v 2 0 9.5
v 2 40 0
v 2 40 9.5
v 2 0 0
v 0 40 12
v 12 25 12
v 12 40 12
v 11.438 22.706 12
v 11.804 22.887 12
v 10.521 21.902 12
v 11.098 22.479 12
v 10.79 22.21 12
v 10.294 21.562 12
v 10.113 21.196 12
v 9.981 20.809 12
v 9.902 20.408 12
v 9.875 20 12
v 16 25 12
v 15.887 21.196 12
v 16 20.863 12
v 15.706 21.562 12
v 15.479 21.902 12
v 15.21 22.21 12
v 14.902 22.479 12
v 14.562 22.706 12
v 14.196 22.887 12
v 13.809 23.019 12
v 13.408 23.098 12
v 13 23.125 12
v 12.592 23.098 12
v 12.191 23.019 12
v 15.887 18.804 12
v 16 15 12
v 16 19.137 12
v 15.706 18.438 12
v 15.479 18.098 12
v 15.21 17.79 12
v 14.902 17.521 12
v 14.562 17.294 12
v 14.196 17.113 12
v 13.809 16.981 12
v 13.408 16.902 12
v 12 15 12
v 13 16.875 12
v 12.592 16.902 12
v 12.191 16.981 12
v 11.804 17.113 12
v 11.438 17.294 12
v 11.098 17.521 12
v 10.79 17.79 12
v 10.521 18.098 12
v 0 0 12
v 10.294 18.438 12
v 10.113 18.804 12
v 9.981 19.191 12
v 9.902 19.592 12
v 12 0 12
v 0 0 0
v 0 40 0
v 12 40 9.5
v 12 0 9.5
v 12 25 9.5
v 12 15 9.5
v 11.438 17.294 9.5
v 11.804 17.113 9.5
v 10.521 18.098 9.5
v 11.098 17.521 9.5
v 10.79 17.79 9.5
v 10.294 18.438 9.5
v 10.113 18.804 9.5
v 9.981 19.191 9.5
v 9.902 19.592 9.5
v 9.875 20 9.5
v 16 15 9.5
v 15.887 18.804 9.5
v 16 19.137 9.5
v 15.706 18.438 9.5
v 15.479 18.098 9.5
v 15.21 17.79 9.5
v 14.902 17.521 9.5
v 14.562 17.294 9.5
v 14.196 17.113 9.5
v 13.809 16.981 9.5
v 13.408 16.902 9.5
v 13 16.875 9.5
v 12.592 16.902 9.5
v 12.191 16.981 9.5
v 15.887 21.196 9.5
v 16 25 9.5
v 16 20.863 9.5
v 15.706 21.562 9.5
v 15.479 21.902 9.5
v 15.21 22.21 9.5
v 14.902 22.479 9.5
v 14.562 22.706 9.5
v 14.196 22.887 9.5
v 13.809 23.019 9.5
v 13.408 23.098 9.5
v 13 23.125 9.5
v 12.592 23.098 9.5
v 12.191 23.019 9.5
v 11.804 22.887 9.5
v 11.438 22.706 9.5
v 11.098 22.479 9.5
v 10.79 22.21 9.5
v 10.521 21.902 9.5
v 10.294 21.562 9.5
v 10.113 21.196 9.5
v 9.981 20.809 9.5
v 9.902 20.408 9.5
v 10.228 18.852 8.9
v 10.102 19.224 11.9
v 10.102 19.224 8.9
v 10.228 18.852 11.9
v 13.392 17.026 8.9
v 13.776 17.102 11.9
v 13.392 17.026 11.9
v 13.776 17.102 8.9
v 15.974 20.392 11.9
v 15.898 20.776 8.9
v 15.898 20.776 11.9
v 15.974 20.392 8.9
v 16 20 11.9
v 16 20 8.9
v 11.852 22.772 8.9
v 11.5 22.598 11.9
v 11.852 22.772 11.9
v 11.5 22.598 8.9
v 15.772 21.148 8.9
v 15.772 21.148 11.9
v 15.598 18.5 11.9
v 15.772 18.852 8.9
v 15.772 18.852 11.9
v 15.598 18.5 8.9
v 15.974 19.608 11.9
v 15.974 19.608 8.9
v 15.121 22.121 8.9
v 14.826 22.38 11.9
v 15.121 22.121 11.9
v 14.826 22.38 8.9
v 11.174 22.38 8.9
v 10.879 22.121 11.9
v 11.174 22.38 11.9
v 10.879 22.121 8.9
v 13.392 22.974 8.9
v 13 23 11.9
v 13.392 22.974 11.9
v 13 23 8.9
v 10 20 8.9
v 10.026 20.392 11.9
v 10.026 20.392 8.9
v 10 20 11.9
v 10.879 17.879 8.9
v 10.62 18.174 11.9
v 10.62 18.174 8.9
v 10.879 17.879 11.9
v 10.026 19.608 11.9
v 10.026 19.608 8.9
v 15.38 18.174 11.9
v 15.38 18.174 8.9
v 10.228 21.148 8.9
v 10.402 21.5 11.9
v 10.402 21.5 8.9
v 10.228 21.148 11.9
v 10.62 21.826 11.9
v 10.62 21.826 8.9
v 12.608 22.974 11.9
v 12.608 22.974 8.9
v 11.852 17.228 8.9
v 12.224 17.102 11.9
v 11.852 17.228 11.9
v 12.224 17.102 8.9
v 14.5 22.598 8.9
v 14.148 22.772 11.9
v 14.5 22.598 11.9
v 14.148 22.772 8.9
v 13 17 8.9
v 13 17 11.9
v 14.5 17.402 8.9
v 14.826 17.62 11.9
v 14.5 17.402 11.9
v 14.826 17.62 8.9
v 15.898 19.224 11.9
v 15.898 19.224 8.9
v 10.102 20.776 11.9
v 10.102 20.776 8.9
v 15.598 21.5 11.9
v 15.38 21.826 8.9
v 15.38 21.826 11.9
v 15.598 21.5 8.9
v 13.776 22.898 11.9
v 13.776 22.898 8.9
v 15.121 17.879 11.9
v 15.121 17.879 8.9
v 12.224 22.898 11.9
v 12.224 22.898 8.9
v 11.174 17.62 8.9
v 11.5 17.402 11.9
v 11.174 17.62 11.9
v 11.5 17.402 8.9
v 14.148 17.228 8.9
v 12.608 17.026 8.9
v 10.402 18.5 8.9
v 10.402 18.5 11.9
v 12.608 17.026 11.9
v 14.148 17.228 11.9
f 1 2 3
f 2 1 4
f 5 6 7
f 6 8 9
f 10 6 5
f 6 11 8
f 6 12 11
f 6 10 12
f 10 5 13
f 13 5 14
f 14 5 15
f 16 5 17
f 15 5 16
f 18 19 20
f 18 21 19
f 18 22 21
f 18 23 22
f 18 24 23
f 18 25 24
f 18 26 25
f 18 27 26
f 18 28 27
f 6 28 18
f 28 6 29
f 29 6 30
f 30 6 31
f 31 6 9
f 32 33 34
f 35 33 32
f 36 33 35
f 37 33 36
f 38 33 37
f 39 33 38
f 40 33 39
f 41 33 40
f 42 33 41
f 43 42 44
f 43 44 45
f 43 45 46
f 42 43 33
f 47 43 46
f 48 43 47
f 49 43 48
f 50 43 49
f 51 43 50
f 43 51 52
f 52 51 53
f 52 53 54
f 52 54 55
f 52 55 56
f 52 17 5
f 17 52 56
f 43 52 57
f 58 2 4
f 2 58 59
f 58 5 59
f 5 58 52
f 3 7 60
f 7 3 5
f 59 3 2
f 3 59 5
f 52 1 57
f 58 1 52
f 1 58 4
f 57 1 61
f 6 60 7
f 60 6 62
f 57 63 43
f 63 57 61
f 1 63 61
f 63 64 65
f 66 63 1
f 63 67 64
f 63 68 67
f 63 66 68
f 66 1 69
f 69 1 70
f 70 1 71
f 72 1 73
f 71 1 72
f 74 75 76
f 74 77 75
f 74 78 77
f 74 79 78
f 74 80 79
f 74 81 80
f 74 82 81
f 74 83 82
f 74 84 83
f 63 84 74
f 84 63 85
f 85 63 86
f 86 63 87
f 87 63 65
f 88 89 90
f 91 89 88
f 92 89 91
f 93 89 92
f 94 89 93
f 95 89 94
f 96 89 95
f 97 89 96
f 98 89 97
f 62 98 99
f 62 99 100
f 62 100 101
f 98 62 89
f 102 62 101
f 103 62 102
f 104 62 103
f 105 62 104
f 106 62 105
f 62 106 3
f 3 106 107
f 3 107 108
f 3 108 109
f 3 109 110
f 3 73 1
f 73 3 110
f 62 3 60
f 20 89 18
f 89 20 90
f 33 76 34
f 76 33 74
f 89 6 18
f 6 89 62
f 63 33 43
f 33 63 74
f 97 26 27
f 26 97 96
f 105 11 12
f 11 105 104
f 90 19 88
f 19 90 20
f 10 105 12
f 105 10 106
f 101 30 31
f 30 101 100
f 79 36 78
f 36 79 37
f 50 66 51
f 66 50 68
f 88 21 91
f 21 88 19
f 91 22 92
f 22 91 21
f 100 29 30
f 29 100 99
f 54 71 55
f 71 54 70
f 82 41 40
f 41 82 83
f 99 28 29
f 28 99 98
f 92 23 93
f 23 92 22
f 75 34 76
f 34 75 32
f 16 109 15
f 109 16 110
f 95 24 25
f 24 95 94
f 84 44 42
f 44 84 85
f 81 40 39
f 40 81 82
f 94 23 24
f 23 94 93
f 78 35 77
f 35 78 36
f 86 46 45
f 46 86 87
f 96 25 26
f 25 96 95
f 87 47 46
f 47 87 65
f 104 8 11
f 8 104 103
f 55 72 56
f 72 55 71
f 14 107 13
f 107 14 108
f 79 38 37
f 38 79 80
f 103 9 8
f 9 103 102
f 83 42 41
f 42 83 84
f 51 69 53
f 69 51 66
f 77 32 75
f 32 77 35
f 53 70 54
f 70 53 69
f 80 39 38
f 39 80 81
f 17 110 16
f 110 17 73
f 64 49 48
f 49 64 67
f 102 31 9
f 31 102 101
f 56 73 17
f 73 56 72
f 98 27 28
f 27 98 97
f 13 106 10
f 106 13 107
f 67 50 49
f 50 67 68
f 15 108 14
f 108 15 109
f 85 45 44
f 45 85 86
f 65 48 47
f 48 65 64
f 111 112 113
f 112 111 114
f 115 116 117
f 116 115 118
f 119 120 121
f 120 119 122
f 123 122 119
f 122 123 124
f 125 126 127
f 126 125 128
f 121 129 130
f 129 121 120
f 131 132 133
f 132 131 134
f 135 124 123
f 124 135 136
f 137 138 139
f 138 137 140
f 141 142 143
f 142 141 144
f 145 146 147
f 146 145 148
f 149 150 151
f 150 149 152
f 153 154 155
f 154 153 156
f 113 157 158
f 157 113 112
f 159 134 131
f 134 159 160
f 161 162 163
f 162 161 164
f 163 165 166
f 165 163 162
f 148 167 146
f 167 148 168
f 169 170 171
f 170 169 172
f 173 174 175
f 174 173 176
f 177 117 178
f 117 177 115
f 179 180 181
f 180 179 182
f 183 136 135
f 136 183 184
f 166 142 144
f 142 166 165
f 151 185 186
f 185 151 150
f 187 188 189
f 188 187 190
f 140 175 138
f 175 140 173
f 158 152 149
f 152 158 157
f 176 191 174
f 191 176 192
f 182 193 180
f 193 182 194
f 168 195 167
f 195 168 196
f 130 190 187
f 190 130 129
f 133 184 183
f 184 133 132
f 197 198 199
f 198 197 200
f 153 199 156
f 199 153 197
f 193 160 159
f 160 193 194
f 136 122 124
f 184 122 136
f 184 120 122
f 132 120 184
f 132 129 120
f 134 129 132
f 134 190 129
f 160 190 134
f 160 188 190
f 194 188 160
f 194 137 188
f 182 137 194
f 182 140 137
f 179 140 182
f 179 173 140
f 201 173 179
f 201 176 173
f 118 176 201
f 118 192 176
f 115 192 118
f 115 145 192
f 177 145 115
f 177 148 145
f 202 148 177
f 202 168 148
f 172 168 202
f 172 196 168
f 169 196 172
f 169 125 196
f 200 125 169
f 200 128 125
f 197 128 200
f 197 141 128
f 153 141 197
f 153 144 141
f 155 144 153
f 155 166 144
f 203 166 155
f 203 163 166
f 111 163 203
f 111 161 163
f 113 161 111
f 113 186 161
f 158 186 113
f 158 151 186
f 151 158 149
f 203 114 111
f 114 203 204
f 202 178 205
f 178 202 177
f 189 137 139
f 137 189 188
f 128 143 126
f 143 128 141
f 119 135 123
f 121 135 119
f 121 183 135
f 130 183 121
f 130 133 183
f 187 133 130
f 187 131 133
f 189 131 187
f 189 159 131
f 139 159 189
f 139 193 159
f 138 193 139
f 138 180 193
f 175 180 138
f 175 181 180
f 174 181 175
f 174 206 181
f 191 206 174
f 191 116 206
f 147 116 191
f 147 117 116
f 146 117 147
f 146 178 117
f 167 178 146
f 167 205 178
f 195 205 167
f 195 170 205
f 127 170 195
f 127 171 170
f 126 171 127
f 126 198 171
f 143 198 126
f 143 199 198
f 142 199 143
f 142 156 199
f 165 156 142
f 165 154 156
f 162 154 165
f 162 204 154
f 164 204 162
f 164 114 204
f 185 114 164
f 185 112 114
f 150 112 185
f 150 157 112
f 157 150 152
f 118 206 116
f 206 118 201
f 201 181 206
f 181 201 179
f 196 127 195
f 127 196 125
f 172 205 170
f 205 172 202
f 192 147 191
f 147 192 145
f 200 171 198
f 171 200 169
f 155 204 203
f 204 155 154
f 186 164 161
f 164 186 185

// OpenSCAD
// Review proto (not a part): the drawer's closed-position detent, on a slice of the tray's left ledge, today
// (a 6 × 3 magnet glued in a pocket of the ledge's pad, its twin under the drawer) and proposed (a spring
// tab cut in the ledge, 20 × 2.5 with a 0.6 mm bump, 0.56 % in the print plane, ≈ 3 N; a notch under the
// drawer).  docs/printed-parts-review.md › Drawer.
//
//   openscad -D 'VIEW="today"' -o detent_today.png mechanical/review/proto/detent.scad
VIEW = "today";
LEDGE_X = 12; LEDGE_T = 2.5; L = 40; WALL = 2;
$fn = 48;
module ledge() { cube([WALL, L, 12]); translate([0, 0, 9.5]) cube([LEDGE_X, L, LEDGE_T]); }
module today() {
    difference() {
        union() { ledge(); translate([0, L / 2 - 5, 9.5]) cube([LEDGE_X + 4, 10, LEDGE_T]); }   // the widened pad
        translate([LEDGE_X + 1, L / 2, 9.5 + LEDGE_T - 3.2]) cylinder(d = 6.25, h = 4);          // the magnet pocket
    }
    color("#777") translate([LEDGE_X + 1, L / 2, 9.5 + LEDGE_T - 3.1]) cylinder(d = 6, h = 3);   // the magnet
}
module proposed() {
    difference() {
        ledge();
        // the tab: freed by two 0.8 mm slits along y, 20 mm long, hinged at its rear end
        for (x = [LEDGE_X - 5.5, LEDGE_X - 2.2]) translate([x, L / 2 - 10, 9]) cube([0.8, 20, 4]);
        translate([LEDGE_X - 5.5, L / 2 - 10, 9]) cube([4.1, 0.8, 4]);
    }
    // the bump on the tab's free end, 45° both ways: it drops into a notch under the drawer when closed
    translate([LEDGE_X - 4.7, L / 2 - 8, 9.5 + LEDGE_T - 0.01]) rotate([90, 0, 90]) linear_extrude(2.5) polygon([[0, 0], [0.6, 0.6], [2.4, 0.6], [3, 0]]);
}
color("#a9c4e4") if (VIEW == "today") today(); else proposed();
